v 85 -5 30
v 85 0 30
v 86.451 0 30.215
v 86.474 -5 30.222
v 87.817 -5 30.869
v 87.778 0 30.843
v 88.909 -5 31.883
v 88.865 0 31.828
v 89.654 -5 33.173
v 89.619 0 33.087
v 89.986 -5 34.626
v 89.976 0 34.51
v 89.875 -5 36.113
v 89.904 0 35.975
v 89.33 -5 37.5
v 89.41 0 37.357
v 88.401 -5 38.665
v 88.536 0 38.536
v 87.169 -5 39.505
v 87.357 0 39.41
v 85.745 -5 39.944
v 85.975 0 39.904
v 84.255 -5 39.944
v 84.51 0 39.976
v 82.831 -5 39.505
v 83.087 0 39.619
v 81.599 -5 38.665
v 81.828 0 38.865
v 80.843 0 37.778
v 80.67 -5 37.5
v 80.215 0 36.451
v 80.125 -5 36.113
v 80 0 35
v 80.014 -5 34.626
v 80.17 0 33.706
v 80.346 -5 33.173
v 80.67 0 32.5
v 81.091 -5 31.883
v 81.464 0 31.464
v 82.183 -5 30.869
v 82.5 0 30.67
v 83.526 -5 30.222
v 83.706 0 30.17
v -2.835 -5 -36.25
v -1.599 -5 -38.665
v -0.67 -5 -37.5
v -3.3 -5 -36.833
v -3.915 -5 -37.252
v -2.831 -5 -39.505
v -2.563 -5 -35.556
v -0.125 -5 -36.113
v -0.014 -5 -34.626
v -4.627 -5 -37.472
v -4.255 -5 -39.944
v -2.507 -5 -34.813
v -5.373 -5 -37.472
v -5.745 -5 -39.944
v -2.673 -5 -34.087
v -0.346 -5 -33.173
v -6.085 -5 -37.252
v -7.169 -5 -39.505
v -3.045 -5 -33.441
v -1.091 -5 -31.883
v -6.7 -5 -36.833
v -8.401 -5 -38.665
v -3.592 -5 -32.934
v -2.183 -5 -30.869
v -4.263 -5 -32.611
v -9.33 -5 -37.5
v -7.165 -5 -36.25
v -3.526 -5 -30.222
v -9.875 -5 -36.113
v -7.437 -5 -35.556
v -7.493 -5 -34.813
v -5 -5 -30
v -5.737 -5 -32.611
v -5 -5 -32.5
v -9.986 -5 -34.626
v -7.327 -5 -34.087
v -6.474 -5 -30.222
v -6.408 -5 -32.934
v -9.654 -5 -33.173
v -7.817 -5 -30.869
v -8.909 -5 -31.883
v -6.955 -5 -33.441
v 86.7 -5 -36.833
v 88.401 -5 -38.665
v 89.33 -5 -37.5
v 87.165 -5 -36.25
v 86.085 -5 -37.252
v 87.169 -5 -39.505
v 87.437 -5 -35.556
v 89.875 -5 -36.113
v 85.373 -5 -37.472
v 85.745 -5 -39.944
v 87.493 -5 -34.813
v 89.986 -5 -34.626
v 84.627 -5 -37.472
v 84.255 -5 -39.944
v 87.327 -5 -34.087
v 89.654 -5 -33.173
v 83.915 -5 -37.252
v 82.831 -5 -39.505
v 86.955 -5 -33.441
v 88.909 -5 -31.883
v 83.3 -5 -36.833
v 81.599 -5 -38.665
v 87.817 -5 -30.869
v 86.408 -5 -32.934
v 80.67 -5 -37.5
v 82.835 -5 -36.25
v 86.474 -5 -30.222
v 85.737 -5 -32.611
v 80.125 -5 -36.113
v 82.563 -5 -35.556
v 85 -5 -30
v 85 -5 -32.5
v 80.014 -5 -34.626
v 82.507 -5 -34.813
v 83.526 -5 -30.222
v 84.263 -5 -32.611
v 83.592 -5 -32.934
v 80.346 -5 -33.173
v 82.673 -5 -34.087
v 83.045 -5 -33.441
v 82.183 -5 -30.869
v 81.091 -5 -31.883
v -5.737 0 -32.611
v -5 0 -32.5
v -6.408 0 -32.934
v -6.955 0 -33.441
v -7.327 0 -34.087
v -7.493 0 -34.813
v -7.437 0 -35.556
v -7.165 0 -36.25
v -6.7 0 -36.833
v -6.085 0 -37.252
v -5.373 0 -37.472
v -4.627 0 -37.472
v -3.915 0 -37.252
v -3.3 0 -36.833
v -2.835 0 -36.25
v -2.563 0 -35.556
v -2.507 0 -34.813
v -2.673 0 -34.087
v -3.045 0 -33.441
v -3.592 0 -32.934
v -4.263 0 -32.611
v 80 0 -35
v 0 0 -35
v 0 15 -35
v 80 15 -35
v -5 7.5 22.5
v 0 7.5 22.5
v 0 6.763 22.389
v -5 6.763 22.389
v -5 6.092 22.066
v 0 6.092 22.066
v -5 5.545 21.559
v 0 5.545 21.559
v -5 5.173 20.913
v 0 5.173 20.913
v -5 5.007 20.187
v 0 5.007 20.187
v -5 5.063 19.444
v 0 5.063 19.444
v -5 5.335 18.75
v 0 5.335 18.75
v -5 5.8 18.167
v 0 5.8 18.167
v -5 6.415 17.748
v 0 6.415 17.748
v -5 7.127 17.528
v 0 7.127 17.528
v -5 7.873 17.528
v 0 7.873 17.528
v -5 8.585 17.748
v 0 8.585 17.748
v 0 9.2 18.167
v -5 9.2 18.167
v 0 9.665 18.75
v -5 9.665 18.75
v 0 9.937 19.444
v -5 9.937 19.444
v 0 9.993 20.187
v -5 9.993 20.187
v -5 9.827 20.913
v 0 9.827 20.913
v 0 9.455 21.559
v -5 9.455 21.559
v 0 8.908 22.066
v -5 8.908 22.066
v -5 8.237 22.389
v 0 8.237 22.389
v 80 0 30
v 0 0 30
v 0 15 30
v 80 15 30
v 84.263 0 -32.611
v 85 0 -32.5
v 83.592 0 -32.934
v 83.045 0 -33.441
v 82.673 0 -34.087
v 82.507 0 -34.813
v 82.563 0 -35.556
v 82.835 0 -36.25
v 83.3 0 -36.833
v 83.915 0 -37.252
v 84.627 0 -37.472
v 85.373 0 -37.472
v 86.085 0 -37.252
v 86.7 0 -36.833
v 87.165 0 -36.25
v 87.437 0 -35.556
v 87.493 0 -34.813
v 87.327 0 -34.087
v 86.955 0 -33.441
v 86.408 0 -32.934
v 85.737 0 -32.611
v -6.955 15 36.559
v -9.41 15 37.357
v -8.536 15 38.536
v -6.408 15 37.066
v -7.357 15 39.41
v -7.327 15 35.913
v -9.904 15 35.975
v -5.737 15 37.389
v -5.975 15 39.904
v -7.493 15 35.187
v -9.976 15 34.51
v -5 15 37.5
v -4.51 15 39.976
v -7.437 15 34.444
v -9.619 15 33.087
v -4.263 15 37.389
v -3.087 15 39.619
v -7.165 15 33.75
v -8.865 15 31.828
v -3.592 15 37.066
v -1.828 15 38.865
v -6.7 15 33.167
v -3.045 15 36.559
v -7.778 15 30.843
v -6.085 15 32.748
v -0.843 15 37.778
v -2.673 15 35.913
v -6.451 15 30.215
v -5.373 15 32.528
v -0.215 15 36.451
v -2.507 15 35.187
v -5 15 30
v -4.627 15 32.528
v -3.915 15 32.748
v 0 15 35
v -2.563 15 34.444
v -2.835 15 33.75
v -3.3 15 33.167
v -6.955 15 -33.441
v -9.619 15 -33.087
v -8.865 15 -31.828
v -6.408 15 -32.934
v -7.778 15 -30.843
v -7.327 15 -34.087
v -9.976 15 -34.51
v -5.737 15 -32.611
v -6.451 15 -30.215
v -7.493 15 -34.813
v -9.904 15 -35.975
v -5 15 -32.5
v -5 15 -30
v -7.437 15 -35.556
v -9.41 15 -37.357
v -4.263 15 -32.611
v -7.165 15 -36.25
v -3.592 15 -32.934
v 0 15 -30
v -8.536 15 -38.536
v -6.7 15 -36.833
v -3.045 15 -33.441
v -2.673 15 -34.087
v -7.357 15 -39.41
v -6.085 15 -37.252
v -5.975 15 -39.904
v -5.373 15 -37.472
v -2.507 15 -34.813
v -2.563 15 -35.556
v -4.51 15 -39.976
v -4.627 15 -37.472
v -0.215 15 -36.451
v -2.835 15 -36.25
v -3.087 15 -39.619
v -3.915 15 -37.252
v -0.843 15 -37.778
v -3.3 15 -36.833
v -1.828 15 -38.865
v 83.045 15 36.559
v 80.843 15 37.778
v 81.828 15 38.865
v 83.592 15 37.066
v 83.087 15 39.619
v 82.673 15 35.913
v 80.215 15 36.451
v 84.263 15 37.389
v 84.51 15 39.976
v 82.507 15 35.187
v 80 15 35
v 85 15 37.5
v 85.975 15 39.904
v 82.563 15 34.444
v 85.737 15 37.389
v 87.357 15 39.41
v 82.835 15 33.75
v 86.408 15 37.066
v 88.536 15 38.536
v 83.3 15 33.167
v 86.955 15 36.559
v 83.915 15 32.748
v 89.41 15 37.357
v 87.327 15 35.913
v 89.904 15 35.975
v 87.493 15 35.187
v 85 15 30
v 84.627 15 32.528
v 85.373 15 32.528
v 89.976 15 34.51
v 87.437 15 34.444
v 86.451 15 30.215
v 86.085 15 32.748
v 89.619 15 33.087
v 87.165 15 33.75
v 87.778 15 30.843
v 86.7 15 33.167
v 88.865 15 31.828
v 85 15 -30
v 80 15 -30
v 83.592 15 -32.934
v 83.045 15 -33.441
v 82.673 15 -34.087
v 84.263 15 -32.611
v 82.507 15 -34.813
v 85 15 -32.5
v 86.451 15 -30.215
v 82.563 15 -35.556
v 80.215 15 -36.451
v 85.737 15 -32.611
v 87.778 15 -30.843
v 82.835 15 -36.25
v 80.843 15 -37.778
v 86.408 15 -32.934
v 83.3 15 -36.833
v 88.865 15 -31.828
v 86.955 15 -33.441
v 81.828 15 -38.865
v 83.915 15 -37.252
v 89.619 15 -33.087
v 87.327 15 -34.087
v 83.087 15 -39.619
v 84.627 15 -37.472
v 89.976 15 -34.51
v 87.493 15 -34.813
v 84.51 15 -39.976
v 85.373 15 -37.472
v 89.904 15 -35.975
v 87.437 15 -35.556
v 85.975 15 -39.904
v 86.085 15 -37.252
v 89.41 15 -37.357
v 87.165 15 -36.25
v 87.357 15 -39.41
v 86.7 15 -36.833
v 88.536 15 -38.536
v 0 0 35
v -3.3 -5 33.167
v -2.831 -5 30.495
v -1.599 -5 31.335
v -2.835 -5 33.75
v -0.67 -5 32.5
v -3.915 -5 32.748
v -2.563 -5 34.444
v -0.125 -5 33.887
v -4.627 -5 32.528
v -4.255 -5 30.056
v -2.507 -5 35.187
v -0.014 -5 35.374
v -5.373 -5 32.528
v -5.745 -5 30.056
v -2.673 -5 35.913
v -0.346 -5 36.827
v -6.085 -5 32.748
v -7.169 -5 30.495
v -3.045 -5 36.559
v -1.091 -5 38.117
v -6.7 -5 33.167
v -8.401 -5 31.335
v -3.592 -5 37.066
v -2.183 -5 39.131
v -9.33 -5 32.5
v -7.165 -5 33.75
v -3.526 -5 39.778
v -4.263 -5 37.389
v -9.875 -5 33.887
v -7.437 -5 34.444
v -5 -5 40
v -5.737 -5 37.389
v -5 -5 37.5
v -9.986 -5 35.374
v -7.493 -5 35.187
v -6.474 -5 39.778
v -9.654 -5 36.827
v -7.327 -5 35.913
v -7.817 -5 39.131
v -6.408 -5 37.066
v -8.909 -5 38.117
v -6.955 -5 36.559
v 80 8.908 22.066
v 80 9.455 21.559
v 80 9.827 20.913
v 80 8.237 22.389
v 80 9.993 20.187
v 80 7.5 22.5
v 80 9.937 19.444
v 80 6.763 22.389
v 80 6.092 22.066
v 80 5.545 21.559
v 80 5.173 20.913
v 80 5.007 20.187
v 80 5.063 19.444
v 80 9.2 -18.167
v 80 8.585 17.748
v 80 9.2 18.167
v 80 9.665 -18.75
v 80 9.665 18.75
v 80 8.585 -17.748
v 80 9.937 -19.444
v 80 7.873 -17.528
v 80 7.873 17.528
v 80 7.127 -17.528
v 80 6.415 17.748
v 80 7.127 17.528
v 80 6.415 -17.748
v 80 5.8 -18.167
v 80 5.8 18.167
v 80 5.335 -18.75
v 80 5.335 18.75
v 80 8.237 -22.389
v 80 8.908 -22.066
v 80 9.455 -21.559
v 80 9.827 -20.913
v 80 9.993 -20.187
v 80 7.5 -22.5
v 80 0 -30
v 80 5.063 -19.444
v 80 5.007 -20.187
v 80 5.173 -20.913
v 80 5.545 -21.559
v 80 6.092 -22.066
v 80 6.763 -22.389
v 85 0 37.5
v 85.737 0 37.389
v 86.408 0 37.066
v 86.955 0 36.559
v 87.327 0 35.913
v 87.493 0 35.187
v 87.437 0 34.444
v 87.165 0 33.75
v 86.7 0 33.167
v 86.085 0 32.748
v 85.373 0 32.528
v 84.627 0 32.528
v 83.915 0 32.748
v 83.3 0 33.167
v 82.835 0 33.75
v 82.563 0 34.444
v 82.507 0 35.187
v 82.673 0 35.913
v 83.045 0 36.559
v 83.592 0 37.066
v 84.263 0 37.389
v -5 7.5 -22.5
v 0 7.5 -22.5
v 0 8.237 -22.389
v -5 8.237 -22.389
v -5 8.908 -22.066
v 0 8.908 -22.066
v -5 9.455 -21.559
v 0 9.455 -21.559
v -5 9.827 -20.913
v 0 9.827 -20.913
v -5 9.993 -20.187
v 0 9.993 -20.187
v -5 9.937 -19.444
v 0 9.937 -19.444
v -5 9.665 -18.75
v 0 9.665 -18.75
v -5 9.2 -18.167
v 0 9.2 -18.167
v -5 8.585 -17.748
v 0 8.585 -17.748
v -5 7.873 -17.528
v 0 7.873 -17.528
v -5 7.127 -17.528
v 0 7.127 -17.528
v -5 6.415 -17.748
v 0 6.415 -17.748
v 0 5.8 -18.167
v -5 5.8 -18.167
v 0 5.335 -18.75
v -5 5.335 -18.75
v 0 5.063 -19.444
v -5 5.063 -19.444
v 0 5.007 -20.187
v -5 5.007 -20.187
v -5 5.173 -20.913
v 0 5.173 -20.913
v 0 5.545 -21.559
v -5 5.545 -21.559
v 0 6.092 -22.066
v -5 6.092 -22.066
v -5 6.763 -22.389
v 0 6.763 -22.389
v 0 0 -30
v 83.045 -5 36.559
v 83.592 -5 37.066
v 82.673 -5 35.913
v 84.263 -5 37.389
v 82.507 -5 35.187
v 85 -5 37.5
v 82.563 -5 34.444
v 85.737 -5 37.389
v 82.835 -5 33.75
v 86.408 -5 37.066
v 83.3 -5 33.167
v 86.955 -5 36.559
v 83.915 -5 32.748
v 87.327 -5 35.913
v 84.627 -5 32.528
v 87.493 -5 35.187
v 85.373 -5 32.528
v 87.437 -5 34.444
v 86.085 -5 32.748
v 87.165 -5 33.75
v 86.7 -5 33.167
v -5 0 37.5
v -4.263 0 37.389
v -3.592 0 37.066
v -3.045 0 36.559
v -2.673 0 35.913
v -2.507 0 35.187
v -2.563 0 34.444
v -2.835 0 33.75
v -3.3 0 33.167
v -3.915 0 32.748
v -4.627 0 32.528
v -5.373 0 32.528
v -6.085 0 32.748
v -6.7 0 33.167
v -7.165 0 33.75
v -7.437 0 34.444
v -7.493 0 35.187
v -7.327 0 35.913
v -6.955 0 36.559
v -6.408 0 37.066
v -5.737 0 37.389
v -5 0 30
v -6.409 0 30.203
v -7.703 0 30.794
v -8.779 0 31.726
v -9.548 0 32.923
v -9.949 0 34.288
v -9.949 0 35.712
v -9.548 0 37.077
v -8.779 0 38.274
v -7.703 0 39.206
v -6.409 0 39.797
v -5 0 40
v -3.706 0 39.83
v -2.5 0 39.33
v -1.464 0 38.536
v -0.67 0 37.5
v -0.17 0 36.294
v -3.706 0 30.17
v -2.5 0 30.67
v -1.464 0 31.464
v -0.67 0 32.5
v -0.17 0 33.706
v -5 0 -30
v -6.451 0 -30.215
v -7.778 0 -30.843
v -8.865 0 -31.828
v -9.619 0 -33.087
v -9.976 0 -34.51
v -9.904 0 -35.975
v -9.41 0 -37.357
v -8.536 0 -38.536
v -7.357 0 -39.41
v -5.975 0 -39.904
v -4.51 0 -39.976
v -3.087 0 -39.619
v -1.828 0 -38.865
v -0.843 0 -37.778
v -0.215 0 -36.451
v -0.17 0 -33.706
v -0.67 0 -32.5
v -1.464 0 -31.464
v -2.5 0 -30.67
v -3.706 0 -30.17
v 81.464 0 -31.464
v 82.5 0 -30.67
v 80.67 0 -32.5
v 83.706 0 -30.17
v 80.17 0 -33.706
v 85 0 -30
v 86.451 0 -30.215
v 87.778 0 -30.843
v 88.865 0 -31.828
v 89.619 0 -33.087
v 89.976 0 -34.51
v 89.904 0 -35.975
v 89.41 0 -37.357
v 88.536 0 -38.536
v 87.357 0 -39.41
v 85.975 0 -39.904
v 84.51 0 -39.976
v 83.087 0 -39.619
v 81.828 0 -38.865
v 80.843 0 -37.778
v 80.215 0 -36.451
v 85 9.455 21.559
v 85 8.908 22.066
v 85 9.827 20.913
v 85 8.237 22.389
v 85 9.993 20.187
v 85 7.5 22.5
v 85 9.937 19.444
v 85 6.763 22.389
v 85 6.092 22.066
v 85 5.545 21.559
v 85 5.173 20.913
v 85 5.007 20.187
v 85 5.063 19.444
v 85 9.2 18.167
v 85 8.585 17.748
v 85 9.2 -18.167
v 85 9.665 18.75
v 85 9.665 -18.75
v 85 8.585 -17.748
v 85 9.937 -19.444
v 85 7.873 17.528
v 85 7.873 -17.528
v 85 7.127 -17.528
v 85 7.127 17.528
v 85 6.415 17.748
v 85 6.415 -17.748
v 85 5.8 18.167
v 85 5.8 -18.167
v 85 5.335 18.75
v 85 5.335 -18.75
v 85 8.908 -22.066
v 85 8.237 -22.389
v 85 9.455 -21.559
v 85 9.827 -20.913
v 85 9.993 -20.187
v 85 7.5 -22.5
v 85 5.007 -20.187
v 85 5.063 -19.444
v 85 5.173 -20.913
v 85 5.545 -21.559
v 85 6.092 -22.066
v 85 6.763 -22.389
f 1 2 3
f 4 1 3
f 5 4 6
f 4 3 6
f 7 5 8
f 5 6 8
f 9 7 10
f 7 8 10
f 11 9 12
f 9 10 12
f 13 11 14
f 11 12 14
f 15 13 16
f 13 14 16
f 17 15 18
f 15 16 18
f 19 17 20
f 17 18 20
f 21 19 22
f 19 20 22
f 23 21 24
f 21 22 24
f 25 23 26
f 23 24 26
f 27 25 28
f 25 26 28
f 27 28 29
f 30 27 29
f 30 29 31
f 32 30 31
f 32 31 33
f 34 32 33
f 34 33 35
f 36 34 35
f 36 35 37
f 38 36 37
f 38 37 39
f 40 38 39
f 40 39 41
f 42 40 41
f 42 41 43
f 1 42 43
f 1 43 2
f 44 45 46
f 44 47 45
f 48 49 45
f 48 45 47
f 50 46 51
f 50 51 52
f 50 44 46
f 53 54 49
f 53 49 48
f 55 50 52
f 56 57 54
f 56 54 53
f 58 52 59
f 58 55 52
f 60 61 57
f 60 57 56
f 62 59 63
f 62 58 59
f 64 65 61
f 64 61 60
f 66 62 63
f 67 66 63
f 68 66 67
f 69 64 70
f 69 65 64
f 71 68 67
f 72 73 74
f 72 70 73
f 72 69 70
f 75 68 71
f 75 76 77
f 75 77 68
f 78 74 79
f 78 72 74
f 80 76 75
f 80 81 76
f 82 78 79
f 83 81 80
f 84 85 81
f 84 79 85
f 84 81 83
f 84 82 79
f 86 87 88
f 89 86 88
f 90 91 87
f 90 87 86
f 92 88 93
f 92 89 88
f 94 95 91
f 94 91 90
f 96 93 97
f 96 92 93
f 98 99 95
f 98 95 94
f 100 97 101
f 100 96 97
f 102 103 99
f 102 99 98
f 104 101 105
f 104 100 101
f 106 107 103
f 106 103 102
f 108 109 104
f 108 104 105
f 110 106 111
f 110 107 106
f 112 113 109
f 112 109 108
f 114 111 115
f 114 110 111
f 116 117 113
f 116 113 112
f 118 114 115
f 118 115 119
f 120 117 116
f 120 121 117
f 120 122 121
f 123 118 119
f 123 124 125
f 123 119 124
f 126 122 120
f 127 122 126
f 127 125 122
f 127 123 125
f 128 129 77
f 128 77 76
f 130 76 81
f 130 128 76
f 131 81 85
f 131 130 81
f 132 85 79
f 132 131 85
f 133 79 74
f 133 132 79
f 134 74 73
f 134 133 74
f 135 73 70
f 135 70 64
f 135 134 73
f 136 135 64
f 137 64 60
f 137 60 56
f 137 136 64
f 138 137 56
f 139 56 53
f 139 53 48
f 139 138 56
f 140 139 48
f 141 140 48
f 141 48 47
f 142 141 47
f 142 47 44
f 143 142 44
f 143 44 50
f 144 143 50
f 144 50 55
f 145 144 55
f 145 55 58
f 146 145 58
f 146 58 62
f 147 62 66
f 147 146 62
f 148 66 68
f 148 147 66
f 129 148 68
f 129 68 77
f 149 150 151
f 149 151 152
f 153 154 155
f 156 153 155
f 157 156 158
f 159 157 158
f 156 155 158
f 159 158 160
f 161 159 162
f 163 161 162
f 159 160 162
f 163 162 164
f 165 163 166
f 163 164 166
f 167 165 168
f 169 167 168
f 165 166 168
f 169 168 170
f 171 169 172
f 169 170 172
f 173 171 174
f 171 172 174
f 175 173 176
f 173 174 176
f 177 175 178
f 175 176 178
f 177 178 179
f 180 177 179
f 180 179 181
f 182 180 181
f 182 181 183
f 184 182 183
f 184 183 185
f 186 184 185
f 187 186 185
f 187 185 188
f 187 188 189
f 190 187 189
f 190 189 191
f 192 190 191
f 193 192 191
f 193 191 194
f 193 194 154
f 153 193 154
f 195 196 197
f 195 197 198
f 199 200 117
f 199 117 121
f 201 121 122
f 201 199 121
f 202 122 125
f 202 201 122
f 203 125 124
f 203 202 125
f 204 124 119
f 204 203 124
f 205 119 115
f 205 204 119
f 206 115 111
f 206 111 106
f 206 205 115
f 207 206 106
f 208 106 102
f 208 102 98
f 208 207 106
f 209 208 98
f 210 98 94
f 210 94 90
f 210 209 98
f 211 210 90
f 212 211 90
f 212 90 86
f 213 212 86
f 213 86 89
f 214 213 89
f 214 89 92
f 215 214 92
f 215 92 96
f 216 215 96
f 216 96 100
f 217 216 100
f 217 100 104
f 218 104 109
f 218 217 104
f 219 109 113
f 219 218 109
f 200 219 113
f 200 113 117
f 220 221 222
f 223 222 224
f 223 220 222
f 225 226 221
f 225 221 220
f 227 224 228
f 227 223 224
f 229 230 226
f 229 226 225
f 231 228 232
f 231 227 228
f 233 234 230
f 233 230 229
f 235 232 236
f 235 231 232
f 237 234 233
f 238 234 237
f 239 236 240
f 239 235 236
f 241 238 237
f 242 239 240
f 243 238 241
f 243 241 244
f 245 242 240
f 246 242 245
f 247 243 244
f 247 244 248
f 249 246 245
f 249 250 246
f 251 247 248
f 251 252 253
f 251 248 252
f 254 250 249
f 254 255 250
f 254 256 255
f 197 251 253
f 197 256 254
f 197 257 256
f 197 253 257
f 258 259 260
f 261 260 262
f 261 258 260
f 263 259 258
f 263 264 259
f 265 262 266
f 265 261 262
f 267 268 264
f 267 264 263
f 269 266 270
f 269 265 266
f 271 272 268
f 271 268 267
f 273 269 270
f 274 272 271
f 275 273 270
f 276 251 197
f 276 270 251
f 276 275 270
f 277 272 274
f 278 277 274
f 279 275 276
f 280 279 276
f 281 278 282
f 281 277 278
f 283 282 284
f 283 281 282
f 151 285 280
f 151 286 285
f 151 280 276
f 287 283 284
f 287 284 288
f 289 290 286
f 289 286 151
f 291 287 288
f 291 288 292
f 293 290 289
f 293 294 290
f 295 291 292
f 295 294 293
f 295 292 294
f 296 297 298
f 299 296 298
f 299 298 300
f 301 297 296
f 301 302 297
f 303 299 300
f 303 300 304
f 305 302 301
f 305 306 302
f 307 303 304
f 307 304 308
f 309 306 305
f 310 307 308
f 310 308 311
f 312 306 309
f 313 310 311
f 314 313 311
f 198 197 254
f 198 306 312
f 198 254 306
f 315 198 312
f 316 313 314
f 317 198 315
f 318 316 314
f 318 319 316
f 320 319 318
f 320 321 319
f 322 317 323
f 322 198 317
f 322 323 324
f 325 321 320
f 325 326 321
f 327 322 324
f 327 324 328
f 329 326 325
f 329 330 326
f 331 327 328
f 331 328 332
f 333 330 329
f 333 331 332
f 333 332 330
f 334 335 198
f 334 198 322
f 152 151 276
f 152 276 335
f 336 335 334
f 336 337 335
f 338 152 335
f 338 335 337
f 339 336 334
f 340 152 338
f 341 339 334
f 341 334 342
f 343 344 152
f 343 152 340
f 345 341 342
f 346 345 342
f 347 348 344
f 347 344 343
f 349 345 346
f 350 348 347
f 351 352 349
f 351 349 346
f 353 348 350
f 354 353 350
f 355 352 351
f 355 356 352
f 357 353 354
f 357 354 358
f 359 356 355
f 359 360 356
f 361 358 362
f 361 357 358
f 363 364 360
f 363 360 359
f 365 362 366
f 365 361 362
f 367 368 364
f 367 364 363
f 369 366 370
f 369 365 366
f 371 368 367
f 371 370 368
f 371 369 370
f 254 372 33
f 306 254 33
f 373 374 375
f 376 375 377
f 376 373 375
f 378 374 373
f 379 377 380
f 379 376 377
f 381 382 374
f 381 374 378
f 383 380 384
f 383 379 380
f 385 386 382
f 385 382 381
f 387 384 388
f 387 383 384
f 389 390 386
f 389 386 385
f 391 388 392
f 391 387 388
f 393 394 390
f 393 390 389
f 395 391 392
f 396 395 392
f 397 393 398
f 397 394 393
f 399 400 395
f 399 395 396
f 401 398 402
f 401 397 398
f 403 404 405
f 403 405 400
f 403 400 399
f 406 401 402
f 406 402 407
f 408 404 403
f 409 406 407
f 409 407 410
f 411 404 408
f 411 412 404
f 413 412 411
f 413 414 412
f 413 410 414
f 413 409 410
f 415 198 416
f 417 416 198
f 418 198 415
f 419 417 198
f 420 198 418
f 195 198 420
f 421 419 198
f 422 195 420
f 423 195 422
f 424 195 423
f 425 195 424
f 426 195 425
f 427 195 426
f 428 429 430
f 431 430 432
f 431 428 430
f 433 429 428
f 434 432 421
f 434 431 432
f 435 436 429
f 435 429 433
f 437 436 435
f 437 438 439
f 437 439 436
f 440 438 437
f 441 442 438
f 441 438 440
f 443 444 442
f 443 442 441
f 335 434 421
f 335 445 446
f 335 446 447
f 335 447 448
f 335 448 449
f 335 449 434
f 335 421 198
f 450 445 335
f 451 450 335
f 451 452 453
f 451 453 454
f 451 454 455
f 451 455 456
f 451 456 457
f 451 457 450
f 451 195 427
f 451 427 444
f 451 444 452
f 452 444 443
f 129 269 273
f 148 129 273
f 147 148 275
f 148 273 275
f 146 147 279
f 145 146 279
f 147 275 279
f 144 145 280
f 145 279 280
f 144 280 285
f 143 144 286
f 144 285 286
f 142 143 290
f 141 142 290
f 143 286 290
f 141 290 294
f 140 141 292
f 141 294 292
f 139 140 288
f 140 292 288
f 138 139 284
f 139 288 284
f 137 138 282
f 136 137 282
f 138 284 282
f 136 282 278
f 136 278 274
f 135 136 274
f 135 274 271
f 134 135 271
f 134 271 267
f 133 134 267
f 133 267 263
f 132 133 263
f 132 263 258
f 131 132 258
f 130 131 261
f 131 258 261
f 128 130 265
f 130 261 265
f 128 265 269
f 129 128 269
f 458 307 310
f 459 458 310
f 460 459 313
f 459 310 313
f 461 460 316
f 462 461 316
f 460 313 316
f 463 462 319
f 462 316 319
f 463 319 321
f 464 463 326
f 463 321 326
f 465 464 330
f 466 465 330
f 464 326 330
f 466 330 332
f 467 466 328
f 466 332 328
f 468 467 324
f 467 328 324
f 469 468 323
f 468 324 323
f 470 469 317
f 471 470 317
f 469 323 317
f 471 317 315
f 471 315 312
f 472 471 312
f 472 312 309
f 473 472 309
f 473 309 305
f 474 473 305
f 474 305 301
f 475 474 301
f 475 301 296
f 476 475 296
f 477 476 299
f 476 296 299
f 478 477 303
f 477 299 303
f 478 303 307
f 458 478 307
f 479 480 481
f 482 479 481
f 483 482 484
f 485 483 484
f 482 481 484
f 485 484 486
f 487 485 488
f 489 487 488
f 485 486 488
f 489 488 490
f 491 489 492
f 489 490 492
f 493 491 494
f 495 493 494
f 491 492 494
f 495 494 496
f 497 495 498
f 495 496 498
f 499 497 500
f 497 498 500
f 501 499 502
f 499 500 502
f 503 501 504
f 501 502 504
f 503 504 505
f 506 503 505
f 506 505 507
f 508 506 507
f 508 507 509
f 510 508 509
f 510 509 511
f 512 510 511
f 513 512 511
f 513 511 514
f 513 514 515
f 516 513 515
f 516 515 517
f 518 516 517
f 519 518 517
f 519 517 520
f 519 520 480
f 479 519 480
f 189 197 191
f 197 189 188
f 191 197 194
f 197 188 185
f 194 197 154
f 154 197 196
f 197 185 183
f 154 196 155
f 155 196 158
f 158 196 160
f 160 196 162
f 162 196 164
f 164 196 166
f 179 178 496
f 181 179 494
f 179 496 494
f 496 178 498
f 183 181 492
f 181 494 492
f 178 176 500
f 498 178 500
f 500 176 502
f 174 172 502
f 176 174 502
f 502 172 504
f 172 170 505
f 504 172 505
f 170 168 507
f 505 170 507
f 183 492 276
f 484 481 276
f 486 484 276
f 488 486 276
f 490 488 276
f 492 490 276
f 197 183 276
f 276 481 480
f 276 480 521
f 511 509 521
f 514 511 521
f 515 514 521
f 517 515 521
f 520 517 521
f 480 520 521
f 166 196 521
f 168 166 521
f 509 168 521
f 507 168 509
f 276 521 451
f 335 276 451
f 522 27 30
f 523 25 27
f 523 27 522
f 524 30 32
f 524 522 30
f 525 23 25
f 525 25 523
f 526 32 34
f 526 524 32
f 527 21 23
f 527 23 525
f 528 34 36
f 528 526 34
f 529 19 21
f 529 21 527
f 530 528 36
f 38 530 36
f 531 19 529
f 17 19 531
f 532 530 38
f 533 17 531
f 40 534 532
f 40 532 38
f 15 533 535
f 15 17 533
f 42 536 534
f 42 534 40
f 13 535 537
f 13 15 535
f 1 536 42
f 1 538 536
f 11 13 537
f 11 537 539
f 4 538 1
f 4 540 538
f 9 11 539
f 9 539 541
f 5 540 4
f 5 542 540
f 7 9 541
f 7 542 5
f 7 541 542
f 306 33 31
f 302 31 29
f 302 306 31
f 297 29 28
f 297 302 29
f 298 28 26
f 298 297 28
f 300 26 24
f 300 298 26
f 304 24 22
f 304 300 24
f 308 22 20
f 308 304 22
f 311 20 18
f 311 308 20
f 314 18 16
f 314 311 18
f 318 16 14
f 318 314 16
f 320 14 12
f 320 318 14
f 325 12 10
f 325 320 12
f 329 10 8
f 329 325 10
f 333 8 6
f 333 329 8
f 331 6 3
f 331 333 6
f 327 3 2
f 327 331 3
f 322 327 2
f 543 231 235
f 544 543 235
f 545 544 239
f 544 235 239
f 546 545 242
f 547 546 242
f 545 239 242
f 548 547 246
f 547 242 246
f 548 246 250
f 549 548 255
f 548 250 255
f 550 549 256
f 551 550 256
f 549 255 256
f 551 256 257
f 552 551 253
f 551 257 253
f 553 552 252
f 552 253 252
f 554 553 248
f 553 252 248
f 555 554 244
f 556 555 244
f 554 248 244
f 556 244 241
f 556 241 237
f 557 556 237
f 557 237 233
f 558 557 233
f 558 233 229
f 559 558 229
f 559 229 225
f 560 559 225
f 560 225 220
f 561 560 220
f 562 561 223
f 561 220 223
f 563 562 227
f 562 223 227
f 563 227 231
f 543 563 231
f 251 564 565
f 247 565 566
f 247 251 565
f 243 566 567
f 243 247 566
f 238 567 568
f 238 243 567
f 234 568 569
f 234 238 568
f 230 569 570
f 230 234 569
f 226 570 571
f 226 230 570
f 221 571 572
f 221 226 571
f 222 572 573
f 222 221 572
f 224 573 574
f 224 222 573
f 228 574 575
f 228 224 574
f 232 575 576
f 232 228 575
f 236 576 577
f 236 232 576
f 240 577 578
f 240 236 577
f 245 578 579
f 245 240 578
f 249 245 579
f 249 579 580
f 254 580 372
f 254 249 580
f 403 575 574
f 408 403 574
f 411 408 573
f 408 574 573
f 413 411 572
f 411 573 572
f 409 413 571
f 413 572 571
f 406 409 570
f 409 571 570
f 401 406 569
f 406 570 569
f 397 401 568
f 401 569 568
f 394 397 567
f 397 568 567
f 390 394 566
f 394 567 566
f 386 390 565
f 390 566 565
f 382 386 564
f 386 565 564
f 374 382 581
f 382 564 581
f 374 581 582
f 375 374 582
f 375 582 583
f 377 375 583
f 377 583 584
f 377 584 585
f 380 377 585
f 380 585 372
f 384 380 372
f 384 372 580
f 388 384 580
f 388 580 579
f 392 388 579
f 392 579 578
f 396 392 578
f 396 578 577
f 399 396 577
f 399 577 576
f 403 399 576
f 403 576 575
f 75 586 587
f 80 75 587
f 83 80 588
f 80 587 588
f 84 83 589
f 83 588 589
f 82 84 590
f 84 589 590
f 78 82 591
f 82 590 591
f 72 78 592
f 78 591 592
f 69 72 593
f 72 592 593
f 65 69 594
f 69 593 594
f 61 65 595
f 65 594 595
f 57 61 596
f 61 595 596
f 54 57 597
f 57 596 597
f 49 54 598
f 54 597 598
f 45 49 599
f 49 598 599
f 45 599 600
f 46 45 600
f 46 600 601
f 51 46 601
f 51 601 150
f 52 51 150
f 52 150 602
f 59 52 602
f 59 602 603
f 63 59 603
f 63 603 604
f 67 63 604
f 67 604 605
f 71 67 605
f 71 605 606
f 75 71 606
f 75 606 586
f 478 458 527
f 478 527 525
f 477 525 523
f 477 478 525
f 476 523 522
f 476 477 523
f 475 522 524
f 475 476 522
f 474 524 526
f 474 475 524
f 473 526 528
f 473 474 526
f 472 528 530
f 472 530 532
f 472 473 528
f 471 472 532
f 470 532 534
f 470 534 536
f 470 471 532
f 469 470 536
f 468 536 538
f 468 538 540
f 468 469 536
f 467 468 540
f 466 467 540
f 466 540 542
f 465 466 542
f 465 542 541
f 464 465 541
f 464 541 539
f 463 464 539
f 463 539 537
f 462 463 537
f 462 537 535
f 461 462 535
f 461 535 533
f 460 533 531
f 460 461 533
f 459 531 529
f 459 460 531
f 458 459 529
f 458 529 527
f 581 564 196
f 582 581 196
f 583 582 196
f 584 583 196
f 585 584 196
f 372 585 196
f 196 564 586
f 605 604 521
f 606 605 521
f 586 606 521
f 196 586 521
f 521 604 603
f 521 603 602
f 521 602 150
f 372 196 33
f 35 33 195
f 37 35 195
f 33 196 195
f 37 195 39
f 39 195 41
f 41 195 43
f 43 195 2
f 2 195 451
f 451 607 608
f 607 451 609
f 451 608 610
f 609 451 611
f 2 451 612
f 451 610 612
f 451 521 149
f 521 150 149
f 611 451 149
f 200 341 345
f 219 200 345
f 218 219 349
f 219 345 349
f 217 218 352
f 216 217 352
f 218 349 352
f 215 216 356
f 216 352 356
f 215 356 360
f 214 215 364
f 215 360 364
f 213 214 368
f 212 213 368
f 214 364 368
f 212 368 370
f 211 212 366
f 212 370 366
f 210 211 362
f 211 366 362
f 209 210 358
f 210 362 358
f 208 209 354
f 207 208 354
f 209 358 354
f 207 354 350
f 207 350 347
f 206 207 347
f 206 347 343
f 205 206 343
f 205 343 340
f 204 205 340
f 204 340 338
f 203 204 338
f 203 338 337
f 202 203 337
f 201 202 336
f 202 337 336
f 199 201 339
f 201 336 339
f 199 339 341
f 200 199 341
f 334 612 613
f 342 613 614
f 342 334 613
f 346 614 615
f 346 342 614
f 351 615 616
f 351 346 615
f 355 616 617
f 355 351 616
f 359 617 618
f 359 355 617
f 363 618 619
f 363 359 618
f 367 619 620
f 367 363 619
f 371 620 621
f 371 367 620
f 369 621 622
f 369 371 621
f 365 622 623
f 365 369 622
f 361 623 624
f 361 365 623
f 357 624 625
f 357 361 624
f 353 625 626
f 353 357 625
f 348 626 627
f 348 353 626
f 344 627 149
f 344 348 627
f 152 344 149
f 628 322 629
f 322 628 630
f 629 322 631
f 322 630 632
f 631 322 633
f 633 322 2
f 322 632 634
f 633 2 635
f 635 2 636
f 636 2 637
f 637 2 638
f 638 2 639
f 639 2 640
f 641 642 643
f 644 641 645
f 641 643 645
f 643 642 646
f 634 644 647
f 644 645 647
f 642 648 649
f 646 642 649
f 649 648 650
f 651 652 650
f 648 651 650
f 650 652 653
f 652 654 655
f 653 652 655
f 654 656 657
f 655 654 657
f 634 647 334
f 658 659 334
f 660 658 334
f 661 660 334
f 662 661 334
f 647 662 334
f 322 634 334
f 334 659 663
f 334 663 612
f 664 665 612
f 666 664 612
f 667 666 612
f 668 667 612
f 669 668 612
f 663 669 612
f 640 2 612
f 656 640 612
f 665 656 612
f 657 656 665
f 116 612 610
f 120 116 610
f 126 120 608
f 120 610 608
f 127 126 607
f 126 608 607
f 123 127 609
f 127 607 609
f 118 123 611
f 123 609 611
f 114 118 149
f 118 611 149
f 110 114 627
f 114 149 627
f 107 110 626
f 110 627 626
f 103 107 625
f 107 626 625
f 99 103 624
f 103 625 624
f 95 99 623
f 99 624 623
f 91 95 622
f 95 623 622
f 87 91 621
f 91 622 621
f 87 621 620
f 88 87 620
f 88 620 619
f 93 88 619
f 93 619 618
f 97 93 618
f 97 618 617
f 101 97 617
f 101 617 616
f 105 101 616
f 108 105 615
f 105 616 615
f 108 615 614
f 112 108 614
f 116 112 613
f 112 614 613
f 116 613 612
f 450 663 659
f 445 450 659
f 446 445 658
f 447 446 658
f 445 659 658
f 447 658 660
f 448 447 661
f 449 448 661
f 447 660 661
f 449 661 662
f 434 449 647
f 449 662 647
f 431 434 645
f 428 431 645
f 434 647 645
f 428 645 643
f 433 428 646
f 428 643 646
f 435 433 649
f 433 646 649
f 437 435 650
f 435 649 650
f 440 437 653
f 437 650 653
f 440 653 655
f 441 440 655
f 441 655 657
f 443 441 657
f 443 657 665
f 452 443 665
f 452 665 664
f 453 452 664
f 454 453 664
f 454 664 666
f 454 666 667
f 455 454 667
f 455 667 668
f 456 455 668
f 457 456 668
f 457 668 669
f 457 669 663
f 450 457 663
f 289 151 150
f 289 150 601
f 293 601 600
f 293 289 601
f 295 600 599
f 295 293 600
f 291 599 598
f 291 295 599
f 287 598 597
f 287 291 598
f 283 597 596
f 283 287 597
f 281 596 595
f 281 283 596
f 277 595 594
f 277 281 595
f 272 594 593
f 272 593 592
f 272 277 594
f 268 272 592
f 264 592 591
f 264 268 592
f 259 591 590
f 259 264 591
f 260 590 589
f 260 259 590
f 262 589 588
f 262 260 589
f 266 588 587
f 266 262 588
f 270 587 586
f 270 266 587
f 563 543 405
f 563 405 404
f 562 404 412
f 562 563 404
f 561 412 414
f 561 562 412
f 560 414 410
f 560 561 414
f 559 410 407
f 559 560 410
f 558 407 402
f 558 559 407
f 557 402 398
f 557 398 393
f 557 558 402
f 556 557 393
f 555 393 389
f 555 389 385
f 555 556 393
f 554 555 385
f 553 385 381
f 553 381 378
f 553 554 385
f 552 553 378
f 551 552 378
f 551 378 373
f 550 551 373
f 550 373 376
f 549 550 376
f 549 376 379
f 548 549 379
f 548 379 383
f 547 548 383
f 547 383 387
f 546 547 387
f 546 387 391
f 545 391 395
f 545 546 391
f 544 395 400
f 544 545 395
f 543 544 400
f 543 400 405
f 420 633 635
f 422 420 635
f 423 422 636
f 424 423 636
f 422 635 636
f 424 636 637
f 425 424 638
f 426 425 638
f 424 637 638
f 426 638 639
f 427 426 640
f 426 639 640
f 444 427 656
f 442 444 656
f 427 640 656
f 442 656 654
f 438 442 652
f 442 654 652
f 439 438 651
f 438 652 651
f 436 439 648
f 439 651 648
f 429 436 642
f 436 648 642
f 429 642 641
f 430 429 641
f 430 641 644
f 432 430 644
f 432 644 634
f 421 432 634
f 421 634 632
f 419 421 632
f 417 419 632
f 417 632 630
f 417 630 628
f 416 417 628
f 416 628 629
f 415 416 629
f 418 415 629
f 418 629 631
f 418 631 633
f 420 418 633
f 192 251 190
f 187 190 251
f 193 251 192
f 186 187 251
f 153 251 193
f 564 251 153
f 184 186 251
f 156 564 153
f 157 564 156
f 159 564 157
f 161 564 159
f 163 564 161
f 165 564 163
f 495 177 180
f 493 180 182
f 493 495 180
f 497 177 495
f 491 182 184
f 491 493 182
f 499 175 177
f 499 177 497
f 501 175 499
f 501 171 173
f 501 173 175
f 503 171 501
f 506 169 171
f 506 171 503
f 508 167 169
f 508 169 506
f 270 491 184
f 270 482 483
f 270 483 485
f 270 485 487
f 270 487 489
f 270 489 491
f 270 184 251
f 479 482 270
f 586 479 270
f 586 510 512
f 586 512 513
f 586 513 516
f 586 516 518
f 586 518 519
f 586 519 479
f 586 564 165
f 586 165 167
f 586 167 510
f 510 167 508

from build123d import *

# Parameters (mm, degrees)
SKETCH_1_W          = 90
SKETCH_1_H          = 70
SKETCH_1_W_2        = 80
SKETCH_1_H_2        = 60
EXTRUDE_1_DEPTH     = 15
SKETCH_2_R          = 2.5
CUT_EXTRUDE_1_DEPTH = 98.724101428
SKETCH_3_R          = 5
EXTRUDE_3_DEPTH     = 15
SKETCH_5_R          = 2.5
CUT_EXTRUDE_2_DEPTH = 15
SKETCH_13_R         = 5
SKETCH_13_R_2       = 2.5
EXTRUDE_4_DEPTH     = 5


with BuildPart() as part:
    # 草图1 → 凸台-拉伸1 (new body)
    with BuildSketch(Plane(origin=(0, 0, 0), x_dir=(1, 0, 0), z_dir=(0, 1, 0))):
        with Locations((40, 0)):
            Rectangle(SKETCH_1_W, SKETCH_1_H)
        with Locations((40, 0)):
            Rectangle(SKETCH_1_W_2, SKETCH_1_H_2, mode=Mode.SUBTRACT)
    extrude(amount=EXTRUDE_1_DEPTH)

    # 草图2 → 切除-拉伸1 (cut, through all)
    with BuildSketch(Plane(origin=(85, 0, 0), x_dir=(0, 0, -1), z_dir=(1, 0, 0))):
        with Locations((20, 7.5)):
            Circle(SKETCH_2_R)
        with Locations(Location((-20, 7.5, 0), (0, 0, 180))):
            Circle(SKETCH_2_R)
    extrude(amount=-CUT_EXTRUDE_1_DEPTH, mode=Mode.SUBTRACT)

    # 草图3 → 凸台-拉伸3 (add)
    with BuildSketch(Plane(origin=(0, 15, 0), x_dir=(1, 0, 0), z_dir=(0, 1, 0))):
        with Locations((85, 35)):
            Circle(SKETCH_3_R)
        with Locations((85, -35)):
            Circle(SKETCH_3_R)
        with Locations((-5, -35)):
            Circle(SKETCH_3_R)
        with Locations((-5, 35)):
            Circle(SKETCH_3_R)
    extrude(amount=-EXTRUDE_3_DEPTH)

    # 草图5 → 切除-拉伸2 (cut)
    with BuildSketch(Plane(origin=(0, 15, 0), x_dir=(1, 0, 0), z_dir=(0, 1, 0))):
        with Locations(Location((-5, -35, 0), (0, 0, 270))):
            Circle(SKETCH_5_R)
        with Locations(Location((-5, 35, 0), (0, 0, 270))):
            Circle(SKETCH_5_R)
        with Locations(Location((85, 35, 0), (0, 0, 270))):
            Circle(SKETCH_5_R)
        with Locations(Location((85, -35, 0), (0, 0, 270))):
            Circle(SKETCH_5_R)
    extrude(amount=-CUT_EXTRUDE_2_DEPTH, mode=Mode.SUBTRACT)

    # 草图13 → 凸台-拉伸4 (add)
    # profile 1 of 4: a face of its own
    with BuildSketch(Plane.XZ):
        with Locations(Location((85, -35, 0), (0, 0, 90))):
            Circle(SKETCH_13_R)
        with Locations(Location((85, -35, 0), (0, 0, 90))):
            Circle(SKETCH_13_R_2, mode=Mode.SUBTRACT)
    # profile 2 of 4: a face of its own
    with BuildSketch(Plane.XZ):
        with Locations(Location((85, 35, 0), (0, 0, 270))):
            Circle(SKETCH_13_R)
        with Locations(Location((85, 35, 0), (0, 0, 90))):
            Circle(SKETCH_13_R_2, mode=Mode.SUBTRACT)
    # profile 3 of 4: a face of its own
    with BuildSketch(Plane.XZ):
        with Locations(Location((-5, 35, 0), (0, 0, 90))):
            Circle(SKETCH_13_R)
        with Locations(Location((-5, 35, 0), (0, 0, 90))):
            Circle(SKETCH_13_R_2, mode=Mode.SUBTRACT)
    # profile 4 of 4: a face of its own
    with BuildSketch(Plane.XZ):
        with Locations(Location((-5, -35, 0), (0, 0, 90))):
            Circle(SKETCH_13_R)
        with Locations(Location((-5, -35, 0), (0, 0, 90))):
            Circle(SKETCH_13_R_2, mode=Mode.SUBTRACT)
    extrude(amount=EXTRUDE_4_DEPTH)


solid = part.part
